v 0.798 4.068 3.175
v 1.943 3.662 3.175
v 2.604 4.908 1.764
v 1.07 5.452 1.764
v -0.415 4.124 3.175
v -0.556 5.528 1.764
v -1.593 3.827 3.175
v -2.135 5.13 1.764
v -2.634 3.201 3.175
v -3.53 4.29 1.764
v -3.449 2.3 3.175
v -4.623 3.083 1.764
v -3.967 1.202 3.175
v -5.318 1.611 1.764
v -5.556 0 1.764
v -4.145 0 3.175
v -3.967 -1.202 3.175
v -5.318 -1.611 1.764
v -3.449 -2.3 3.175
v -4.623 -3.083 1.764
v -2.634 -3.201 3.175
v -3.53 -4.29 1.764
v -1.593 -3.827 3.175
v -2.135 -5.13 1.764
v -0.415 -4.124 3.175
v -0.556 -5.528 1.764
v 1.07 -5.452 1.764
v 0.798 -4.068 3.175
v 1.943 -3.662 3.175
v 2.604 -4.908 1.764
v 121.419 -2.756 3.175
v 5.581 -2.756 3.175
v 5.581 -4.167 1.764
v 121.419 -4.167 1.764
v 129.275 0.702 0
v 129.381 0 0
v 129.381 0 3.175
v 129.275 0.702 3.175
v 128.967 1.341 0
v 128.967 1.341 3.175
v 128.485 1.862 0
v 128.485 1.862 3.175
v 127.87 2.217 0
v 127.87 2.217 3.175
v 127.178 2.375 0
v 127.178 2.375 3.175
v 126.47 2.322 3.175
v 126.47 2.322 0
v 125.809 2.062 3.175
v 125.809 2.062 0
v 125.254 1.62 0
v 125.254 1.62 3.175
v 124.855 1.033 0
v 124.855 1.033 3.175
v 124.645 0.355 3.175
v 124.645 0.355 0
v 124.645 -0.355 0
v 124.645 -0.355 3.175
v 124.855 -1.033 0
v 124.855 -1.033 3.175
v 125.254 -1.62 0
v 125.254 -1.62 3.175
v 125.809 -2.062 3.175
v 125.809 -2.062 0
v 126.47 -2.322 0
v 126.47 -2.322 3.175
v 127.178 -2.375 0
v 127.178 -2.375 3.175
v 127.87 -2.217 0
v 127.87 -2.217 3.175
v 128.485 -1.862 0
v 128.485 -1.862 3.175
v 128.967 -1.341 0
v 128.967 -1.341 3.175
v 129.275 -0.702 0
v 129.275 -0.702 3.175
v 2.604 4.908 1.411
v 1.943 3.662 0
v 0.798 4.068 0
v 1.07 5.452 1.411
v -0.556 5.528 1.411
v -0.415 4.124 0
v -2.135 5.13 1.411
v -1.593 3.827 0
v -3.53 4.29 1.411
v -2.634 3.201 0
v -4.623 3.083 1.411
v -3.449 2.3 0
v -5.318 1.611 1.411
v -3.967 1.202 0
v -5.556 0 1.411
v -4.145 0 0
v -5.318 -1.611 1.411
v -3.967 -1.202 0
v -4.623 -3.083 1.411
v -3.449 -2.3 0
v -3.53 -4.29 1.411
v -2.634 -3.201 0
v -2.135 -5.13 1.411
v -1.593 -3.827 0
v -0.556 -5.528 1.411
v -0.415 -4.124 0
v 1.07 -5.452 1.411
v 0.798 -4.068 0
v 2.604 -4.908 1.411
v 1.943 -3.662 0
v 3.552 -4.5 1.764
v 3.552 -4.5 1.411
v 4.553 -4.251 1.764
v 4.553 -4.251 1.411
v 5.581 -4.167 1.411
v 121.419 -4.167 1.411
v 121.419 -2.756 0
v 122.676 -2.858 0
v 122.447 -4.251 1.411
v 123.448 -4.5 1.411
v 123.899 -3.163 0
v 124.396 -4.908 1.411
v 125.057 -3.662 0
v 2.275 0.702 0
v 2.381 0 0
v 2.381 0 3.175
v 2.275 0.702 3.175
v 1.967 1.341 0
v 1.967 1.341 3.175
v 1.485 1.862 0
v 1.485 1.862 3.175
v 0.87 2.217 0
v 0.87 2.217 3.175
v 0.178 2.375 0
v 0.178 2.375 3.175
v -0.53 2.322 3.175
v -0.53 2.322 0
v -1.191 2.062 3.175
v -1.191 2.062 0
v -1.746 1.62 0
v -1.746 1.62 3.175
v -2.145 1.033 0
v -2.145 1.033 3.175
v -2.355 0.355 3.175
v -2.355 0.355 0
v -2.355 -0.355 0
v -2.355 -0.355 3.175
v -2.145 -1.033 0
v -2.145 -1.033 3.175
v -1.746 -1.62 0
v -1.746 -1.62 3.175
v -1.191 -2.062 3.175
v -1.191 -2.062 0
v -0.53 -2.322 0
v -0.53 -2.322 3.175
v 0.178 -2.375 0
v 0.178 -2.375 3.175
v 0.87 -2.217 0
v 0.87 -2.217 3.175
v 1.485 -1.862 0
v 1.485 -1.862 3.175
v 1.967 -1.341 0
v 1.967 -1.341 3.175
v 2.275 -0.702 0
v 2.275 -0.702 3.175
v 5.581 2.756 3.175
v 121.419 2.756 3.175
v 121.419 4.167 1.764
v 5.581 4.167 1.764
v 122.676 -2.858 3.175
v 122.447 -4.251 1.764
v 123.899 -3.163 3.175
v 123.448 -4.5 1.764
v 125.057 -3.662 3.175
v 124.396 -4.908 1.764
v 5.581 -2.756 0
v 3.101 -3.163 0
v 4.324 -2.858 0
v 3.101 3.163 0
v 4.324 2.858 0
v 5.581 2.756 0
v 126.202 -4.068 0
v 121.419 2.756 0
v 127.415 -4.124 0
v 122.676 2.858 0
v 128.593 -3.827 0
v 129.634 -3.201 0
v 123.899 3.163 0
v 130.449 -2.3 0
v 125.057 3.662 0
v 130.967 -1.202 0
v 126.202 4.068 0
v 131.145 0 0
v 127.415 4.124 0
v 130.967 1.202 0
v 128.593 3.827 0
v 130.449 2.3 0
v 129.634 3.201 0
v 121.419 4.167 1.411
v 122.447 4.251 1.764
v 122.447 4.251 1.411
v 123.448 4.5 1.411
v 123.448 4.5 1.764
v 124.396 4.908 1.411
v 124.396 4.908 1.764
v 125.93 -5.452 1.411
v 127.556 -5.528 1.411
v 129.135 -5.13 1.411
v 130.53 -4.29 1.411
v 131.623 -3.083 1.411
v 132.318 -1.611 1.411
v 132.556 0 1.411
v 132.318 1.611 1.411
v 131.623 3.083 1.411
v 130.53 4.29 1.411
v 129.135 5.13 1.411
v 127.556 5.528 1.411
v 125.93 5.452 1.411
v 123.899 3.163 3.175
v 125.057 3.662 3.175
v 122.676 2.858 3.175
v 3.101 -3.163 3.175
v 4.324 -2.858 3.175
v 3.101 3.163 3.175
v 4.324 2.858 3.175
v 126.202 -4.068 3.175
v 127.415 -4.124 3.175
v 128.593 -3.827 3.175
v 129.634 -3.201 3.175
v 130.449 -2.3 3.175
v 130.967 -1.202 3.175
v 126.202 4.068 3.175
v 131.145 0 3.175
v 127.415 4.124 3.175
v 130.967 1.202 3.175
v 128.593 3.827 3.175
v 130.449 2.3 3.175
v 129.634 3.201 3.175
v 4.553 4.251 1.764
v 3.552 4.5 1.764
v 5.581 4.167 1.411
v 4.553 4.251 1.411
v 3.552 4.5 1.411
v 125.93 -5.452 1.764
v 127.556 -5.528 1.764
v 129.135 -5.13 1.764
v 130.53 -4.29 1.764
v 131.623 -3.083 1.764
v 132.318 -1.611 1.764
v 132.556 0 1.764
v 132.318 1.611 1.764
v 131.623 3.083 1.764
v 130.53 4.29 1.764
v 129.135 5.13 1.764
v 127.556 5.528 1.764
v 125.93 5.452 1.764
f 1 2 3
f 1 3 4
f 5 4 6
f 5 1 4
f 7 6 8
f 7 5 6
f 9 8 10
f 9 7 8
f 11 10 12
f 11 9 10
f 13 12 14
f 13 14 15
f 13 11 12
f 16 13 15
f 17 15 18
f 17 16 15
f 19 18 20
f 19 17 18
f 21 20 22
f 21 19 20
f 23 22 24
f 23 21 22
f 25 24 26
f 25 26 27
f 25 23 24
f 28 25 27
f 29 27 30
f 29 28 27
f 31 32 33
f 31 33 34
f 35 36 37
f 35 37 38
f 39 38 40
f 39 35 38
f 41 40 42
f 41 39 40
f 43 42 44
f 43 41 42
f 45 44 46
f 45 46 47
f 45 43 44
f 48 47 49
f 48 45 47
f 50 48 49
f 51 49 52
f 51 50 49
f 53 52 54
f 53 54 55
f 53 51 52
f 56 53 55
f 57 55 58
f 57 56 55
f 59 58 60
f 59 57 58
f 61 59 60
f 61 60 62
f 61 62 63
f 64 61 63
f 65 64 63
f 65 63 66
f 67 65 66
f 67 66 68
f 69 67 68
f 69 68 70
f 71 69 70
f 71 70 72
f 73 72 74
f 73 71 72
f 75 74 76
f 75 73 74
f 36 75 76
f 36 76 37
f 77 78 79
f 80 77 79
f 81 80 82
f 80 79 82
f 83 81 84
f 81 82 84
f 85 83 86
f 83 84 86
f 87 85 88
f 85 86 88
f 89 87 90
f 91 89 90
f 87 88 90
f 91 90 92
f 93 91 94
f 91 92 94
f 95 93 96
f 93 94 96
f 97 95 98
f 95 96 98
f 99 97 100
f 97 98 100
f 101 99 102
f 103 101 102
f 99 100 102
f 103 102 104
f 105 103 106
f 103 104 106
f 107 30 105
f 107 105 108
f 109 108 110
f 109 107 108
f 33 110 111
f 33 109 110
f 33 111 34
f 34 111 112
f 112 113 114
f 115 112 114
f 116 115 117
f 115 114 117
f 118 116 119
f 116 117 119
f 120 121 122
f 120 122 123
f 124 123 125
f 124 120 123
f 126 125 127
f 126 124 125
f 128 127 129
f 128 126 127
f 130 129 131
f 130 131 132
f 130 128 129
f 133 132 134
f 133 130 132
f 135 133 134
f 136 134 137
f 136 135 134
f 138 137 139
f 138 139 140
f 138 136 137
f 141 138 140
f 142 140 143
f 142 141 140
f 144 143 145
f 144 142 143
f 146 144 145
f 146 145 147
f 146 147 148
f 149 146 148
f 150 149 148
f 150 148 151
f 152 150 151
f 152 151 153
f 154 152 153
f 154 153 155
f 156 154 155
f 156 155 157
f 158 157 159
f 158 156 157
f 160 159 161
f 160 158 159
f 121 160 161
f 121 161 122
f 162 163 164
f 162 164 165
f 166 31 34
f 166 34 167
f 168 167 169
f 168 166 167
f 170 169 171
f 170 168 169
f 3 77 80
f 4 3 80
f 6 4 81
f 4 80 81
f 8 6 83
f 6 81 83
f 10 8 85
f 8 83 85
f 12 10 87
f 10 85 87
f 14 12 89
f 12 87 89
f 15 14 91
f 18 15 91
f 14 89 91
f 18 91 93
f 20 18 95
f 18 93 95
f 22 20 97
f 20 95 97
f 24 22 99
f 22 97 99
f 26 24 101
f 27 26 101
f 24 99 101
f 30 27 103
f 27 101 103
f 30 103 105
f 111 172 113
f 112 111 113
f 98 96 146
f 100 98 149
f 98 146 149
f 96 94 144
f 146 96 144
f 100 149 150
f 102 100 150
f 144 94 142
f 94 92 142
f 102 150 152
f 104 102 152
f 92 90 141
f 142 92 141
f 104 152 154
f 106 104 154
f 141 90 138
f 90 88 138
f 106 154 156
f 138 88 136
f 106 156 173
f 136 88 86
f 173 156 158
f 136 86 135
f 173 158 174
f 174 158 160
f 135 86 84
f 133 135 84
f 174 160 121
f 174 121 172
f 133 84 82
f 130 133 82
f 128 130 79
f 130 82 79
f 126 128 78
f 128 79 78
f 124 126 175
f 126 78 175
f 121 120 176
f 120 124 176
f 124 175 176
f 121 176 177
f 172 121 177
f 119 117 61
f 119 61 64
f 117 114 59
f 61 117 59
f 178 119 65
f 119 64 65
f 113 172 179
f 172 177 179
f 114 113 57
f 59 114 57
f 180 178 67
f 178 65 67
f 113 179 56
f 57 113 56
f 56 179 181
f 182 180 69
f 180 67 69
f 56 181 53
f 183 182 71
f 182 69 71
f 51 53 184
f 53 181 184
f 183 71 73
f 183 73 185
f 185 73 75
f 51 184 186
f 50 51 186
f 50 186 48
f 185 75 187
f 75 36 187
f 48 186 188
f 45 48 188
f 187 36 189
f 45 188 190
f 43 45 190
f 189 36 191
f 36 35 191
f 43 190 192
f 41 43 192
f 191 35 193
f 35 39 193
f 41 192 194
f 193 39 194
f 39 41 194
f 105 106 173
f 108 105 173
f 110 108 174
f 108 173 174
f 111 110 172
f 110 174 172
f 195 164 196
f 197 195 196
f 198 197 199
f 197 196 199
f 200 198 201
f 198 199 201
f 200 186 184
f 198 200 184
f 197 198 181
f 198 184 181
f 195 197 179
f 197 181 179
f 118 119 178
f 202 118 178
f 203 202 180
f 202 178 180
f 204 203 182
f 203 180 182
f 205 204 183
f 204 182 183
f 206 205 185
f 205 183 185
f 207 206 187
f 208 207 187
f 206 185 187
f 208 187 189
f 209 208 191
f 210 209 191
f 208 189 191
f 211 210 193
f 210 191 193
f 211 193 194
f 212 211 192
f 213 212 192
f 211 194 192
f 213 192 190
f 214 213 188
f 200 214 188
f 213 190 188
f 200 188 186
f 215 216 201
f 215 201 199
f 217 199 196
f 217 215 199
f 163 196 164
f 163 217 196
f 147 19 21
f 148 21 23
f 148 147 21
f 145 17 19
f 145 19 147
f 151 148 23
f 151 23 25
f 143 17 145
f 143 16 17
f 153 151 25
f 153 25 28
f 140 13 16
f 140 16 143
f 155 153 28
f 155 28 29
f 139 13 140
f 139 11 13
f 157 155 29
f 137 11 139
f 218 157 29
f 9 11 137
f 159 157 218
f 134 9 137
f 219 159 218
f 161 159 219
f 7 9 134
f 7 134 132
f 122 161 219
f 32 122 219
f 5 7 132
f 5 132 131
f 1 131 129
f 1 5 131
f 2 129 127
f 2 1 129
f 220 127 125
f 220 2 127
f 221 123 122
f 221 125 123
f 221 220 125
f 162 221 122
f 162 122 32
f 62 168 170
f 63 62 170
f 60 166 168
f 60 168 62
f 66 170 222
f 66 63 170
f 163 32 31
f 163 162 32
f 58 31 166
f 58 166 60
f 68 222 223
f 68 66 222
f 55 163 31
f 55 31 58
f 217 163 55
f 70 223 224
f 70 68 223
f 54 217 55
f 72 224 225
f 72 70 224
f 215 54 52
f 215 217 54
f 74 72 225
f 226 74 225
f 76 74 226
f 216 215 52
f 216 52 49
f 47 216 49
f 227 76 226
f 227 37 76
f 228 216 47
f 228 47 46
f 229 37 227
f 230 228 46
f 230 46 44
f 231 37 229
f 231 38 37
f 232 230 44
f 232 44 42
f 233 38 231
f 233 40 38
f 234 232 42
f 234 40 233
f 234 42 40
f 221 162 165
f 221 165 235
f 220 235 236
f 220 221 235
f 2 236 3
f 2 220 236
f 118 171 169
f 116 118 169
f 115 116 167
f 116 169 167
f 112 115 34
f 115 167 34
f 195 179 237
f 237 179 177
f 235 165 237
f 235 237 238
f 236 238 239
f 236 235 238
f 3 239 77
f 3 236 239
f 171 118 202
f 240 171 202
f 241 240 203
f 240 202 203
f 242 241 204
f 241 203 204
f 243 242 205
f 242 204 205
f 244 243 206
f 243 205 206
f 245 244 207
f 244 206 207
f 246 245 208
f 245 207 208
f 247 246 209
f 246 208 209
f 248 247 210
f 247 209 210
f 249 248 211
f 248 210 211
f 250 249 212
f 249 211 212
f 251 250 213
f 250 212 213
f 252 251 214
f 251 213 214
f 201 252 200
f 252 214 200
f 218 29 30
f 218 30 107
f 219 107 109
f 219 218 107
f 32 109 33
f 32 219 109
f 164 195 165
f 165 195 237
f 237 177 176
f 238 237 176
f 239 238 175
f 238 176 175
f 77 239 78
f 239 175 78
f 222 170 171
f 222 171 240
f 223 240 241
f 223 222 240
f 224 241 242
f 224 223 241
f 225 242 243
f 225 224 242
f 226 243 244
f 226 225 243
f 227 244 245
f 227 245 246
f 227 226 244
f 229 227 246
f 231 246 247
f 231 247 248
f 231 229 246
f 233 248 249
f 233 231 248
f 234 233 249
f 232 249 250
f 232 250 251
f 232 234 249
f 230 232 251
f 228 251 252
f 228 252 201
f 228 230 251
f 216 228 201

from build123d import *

# Parameters (mm, degrees)
F0_R     = 2.38125
F1_DEPTH = 3.175
F2_R     = 6.35
F3_SIZE  = 1.4111111111


with BuildPart() as f1:
    # F0 (on Top) → F1 (new body)
    with BuildSketch(Plane.XY):
        with BuildLine():
            Line((123.3248860695, 4.1671875), (3.6751139305, 4.1671875))
            ThreePointArc((3.6751139305, 4.1671875), (-5.55625, 0), (3.6751139305, -4.1671875))
            Line((3.6751139305, -4.1671875), (123.3248860695, -4.1671875))
            ThreePointArc((123.3248860695, -4.1671875), (132.55625, 0), (123.3248860695, 4.1671875))
        make_face()
        Circle(F0_R, mode=Mode.SUBTRACT)
        with Locations((127, 0)):
            Circle(F0_R, mode=Mode.SUBTRACT)
    extrude(amount=F1_DEPTH)

    # F2
    f2_edges = [f1.edges().sort_by_distance(p)[0] for p in [
        (3.675114, 4.167187, 1.5875),
        (3.675114, -4.167188, 1.5875),
        (123.324886, -4.167187, 1.5875),
        (123.324886, 4.167187, 1.5875),
    ]]
    fillet(f2_edges, radius=F2_R)

    # F3
    f3_edges = [f1.edges().sort_by_distance(p)[0] for p in [
        (63.5, 4.167187, 3.175),
        (63.5, 4.167187, 0),
    ]]
    chamfer(f3_edges, length=F3_SIZE)


solid = f1.part
